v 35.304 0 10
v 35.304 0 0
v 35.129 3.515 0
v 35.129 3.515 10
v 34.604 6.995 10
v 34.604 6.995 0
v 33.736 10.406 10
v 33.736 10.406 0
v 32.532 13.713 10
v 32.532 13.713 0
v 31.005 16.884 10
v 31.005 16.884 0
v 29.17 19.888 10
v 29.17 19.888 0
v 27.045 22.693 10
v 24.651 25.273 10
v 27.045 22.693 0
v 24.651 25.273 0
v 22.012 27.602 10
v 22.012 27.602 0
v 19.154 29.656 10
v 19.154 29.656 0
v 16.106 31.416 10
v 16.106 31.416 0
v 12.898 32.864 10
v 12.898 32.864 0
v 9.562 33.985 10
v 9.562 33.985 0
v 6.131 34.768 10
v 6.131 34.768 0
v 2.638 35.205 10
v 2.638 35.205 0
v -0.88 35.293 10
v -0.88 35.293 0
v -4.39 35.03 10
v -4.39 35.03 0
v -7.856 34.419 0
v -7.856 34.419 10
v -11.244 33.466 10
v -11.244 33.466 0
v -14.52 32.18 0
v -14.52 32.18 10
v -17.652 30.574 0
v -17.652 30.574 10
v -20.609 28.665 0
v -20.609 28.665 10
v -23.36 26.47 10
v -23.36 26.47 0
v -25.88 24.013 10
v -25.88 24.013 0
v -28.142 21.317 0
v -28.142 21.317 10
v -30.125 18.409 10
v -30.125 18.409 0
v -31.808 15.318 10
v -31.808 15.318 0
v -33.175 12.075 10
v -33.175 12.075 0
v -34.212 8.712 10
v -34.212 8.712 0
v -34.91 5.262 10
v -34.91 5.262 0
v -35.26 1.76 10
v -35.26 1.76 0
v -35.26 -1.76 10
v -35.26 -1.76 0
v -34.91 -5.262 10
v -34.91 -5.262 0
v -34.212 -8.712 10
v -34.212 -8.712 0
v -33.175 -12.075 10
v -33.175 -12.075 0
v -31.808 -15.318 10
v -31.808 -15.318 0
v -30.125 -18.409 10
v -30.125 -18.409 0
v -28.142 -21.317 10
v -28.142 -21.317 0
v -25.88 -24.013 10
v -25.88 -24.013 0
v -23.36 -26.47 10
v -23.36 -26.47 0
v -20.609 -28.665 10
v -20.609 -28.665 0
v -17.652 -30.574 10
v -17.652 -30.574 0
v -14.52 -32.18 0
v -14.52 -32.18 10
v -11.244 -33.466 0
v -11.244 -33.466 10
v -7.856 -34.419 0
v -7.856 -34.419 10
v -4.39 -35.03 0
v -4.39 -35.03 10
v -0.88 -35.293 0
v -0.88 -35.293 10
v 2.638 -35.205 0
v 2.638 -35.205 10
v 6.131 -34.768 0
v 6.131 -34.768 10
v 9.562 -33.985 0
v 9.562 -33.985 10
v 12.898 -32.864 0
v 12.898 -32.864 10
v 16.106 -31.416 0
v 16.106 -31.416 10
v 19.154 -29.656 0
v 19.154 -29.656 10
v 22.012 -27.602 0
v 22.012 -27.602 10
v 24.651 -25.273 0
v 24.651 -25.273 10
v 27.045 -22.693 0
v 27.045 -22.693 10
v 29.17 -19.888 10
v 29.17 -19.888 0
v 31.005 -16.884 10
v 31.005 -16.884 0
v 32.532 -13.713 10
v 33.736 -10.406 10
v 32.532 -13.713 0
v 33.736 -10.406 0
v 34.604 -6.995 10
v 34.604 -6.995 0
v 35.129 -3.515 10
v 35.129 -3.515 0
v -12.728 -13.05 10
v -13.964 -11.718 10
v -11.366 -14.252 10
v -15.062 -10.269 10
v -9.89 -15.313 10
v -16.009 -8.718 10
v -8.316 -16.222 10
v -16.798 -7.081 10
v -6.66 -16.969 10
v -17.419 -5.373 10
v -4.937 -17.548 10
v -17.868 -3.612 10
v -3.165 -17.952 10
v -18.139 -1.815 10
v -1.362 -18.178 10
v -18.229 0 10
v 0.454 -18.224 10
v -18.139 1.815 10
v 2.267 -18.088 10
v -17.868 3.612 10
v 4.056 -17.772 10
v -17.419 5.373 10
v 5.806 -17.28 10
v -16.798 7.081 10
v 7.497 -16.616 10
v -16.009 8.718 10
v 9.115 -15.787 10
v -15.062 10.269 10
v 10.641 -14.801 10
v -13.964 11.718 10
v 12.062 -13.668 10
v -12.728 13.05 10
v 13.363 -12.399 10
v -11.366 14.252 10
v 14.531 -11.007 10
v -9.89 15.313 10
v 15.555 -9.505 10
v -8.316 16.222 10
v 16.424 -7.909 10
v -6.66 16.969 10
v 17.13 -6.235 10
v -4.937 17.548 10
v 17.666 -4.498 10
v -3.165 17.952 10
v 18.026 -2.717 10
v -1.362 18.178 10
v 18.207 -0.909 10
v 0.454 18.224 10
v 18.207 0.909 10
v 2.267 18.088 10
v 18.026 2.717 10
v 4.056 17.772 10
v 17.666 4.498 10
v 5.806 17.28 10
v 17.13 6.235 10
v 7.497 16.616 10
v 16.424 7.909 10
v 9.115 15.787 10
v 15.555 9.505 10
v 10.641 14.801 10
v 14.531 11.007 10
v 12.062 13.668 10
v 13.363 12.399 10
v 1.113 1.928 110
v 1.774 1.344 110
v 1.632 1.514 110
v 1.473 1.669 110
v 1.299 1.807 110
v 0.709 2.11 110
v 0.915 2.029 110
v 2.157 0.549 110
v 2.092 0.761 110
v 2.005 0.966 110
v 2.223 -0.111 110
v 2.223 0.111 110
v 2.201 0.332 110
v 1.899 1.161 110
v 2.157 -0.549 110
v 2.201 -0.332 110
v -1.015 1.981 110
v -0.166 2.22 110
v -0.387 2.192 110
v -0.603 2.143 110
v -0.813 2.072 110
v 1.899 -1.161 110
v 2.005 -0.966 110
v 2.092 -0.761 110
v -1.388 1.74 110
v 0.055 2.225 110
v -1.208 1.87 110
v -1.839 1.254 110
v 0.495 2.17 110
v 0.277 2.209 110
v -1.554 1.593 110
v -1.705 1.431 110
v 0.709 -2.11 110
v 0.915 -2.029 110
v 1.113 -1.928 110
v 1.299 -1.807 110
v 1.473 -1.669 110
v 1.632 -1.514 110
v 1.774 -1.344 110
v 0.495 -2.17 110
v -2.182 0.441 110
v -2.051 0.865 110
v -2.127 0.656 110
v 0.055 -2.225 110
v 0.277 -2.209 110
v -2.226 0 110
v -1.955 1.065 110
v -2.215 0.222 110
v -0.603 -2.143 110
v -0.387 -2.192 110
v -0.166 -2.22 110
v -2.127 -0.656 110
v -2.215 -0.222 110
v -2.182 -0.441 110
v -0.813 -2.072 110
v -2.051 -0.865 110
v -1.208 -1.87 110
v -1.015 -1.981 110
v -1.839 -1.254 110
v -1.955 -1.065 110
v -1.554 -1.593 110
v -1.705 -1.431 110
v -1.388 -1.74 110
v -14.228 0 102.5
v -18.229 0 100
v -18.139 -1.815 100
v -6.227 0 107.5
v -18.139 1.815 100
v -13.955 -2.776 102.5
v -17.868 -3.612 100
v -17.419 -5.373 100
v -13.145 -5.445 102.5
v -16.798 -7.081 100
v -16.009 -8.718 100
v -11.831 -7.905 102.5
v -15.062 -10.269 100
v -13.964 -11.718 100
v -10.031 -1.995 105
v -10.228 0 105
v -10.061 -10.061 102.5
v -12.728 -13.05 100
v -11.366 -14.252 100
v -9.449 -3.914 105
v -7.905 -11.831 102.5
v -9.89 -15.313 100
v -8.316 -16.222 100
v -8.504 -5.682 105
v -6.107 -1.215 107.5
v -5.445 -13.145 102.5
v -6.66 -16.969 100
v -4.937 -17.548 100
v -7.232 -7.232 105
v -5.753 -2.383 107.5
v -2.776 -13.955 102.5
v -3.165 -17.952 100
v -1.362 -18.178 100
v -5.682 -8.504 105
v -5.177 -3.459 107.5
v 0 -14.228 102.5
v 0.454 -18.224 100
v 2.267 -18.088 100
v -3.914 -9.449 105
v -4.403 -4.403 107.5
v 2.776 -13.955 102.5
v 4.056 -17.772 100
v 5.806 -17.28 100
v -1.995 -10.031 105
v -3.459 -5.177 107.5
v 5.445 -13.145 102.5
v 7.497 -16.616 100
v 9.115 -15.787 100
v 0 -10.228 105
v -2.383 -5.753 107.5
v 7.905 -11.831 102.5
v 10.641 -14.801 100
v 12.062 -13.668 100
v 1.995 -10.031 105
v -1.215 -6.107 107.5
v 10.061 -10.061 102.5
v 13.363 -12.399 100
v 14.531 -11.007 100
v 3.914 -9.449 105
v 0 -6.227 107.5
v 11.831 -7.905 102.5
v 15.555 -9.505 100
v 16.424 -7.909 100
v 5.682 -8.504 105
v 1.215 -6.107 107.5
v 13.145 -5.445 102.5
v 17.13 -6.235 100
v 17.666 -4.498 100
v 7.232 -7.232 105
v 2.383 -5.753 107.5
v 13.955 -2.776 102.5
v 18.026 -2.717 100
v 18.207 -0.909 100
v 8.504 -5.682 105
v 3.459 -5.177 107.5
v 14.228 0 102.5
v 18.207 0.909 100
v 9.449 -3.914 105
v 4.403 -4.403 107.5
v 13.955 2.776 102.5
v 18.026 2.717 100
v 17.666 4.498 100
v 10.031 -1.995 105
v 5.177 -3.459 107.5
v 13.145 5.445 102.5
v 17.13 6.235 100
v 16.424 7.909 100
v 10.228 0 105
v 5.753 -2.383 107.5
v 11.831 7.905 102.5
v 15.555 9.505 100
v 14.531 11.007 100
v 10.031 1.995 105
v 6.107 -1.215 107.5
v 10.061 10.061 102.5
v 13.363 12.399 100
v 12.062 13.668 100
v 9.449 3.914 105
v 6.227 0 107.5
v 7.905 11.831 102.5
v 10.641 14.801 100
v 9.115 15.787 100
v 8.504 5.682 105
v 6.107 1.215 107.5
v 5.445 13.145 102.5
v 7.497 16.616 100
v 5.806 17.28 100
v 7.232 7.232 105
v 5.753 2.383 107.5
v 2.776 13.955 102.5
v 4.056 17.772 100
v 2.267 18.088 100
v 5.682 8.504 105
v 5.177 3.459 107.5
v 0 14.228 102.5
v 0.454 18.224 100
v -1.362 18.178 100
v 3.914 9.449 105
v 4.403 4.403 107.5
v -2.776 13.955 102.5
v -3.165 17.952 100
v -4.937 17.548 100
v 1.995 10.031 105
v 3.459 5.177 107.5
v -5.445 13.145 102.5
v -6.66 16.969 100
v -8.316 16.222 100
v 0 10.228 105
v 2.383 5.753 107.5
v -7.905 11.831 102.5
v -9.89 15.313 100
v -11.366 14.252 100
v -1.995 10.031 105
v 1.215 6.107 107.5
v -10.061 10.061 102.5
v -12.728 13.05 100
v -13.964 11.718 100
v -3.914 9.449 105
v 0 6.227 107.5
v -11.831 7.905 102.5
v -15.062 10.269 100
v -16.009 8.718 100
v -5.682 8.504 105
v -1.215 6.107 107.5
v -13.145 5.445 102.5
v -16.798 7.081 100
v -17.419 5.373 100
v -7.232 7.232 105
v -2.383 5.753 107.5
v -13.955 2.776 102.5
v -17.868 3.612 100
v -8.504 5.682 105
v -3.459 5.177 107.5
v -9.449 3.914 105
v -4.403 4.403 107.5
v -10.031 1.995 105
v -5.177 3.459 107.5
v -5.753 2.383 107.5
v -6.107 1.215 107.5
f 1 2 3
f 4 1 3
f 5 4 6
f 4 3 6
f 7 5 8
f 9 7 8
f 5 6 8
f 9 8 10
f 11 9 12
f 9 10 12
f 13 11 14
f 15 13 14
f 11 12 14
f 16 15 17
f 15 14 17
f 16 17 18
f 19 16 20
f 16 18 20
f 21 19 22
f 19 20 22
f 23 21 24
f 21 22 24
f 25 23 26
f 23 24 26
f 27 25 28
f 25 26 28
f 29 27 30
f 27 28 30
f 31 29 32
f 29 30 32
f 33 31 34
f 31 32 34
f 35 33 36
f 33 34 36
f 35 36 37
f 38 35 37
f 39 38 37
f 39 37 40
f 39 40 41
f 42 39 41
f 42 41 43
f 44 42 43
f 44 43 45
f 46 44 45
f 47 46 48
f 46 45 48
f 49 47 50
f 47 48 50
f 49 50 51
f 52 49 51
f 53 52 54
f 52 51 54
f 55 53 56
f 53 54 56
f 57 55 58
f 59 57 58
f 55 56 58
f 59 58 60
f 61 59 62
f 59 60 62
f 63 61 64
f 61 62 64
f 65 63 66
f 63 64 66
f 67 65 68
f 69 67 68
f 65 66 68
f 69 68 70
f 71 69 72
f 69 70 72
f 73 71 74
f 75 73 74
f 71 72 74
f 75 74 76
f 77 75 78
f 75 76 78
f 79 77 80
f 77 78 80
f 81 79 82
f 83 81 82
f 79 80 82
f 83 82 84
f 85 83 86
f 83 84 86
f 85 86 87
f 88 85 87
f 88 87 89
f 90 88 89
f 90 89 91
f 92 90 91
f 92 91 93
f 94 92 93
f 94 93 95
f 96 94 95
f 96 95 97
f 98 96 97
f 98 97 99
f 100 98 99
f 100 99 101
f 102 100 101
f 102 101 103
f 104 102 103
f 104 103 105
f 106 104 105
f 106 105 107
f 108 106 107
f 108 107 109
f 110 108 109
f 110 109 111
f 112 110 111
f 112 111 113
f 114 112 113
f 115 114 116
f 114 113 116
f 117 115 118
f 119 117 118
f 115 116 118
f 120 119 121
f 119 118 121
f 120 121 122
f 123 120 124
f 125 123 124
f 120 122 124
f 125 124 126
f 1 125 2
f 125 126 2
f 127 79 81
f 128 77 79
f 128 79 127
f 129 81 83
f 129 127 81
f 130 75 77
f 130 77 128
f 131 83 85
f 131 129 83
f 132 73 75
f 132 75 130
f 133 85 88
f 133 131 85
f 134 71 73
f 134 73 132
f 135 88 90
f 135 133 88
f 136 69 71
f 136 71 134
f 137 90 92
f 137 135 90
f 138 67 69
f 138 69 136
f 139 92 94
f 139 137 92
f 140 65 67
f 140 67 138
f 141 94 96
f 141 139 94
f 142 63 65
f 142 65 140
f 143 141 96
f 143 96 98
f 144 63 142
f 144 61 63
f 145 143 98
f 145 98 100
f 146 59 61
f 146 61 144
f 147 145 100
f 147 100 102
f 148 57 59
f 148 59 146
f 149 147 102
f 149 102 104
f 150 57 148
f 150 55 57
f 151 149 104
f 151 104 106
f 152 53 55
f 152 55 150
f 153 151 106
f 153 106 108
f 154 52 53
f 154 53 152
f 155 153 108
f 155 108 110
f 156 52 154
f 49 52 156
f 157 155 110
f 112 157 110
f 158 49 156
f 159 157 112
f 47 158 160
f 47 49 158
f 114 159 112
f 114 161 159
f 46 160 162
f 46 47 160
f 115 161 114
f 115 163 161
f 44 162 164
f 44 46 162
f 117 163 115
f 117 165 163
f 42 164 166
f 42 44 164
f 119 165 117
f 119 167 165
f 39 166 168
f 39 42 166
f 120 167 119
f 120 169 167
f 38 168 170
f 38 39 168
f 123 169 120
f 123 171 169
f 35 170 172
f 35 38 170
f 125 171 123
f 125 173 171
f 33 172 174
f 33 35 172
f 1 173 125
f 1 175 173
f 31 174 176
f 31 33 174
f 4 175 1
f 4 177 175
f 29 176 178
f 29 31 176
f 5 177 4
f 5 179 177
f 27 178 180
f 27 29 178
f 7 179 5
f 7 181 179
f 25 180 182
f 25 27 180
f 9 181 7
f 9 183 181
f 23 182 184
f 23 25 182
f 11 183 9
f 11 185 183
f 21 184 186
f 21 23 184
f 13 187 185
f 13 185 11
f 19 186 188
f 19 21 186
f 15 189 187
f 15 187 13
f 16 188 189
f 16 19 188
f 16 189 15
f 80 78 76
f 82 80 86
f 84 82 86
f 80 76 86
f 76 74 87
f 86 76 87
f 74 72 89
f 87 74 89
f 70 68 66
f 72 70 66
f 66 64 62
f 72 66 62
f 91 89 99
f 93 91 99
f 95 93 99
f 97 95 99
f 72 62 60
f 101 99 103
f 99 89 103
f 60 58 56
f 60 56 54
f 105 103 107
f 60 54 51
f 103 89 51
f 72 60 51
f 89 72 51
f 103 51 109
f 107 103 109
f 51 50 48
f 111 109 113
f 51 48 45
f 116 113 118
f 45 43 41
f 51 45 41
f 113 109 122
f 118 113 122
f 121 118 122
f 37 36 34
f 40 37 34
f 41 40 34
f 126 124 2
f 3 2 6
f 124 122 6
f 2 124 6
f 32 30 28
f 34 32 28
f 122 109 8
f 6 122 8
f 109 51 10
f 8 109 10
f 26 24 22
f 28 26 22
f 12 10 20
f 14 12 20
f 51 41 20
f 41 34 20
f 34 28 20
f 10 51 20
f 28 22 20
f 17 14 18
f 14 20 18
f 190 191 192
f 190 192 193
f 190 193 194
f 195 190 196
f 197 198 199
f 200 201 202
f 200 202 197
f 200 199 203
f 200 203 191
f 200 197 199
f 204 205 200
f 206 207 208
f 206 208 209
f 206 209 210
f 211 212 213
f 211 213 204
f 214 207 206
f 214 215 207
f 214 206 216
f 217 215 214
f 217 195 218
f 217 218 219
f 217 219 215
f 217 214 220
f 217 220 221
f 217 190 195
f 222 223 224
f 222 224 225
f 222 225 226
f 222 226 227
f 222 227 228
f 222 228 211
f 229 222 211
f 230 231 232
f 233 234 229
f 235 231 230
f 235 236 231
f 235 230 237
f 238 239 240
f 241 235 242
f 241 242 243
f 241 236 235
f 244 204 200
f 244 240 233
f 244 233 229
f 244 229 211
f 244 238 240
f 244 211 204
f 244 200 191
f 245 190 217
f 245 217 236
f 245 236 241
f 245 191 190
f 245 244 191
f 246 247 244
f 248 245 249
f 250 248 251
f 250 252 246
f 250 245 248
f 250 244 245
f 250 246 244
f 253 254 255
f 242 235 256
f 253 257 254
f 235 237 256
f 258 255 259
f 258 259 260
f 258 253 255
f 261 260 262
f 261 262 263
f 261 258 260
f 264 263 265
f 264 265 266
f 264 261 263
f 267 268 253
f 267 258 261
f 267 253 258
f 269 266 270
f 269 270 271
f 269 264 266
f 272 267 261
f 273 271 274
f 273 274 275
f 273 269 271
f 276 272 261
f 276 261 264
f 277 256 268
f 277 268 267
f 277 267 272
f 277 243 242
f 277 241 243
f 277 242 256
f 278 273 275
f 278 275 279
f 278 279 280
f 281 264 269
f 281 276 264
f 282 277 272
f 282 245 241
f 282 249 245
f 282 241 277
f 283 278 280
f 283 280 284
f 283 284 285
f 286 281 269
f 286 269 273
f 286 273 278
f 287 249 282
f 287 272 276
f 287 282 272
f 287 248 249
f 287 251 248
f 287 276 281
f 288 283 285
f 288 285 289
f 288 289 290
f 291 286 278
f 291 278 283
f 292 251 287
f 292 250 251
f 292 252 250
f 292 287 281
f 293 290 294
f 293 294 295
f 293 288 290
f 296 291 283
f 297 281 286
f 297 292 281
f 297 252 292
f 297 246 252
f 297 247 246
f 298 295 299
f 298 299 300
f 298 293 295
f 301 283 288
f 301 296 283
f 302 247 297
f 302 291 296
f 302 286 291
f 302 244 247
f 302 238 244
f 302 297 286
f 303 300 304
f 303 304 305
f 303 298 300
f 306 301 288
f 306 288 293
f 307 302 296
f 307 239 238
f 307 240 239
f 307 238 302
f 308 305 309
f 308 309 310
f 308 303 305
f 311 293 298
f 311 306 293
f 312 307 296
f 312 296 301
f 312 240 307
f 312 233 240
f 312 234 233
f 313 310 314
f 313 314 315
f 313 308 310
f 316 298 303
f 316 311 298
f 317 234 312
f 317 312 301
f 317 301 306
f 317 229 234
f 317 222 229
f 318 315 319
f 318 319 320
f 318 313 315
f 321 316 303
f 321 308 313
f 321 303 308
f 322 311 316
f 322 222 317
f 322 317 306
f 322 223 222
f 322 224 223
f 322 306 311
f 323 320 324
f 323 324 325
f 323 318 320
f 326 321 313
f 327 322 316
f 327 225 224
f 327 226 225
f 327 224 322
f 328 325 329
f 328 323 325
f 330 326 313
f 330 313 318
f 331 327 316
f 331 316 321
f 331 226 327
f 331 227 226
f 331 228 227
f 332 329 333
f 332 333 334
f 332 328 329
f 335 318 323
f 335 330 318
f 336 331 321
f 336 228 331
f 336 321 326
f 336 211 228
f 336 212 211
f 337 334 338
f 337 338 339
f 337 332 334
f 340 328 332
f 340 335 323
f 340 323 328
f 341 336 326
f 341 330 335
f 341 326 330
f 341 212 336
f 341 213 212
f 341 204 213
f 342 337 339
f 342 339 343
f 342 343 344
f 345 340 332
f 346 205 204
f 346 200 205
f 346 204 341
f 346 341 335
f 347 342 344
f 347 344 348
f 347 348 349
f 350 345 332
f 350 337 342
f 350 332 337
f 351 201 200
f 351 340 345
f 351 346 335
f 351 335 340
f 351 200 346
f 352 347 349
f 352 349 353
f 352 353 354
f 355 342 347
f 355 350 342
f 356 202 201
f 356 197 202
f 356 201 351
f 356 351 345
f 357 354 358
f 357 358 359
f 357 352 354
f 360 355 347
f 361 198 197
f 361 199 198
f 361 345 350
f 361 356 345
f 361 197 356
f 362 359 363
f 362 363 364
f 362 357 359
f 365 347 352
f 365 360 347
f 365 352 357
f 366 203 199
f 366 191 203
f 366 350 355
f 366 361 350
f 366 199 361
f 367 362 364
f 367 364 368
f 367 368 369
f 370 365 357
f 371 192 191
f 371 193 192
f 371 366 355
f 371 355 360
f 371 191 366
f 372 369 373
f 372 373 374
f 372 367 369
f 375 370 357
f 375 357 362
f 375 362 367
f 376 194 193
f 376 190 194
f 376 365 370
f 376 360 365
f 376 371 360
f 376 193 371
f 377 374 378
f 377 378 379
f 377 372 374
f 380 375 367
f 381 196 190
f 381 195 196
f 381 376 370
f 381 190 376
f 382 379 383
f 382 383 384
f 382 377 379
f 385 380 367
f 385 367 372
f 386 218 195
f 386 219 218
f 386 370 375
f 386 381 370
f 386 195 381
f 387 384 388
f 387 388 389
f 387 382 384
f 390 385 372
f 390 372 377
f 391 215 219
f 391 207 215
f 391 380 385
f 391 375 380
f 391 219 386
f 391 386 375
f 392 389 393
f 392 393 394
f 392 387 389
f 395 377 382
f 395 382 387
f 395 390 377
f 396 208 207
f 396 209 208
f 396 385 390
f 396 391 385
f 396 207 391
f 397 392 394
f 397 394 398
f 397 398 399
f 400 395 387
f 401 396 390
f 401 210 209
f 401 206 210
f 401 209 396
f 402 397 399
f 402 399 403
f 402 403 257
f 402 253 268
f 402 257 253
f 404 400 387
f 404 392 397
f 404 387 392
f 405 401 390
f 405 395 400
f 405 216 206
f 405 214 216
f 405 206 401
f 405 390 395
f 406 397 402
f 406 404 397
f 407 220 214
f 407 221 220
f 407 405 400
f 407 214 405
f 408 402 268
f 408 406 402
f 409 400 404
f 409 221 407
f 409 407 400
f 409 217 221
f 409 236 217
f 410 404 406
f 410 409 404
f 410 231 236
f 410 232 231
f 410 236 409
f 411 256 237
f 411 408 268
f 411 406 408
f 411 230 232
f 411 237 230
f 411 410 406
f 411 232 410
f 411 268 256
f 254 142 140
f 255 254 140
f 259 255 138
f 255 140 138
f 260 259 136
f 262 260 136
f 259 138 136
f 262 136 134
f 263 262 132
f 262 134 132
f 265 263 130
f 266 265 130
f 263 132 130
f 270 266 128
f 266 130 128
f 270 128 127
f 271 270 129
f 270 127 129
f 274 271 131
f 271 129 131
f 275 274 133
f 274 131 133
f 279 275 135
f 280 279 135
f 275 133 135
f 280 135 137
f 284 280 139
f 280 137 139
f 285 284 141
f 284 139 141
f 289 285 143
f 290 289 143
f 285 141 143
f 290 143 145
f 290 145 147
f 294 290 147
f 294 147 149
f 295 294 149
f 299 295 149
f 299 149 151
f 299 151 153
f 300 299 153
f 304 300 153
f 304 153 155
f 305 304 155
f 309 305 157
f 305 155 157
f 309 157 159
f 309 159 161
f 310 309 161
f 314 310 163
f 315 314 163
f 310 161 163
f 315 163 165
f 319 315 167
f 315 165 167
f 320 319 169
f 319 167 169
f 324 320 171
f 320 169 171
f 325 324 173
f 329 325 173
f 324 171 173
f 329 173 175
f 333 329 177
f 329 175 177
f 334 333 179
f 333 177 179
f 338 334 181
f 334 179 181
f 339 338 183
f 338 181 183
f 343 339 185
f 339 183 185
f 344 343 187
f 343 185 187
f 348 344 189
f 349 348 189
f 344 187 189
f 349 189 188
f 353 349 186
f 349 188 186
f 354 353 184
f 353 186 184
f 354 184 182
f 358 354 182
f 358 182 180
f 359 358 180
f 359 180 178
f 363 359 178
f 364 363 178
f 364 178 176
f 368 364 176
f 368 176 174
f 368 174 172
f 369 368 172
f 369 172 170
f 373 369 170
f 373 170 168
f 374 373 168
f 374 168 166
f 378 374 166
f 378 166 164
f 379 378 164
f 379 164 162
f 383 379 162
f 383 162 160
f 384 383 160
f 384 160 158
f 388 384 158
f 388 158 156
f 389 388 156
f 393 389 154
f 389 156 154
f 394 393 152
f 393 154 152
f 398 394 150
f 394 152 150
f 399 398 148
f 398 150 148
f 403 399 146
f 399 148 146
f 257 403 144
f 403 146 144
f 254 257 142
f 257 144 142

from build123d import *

# Parameters (mm, degrees)
SKETCH1_R           = 35.304197416
BOSS_EXTRUDE1_DEPTH = 10
SKETCH2_R           = 18.229259508
BOSS_EXTRUDE2_DEPTH = 100
CHAMFER1_SIZE       = 10
CHAMFER1_SIZE2      = 16.00334529


with BuildPart() as part:
    # Sketch1 → Boss-Extrude1 (new body)
    with BuildSketch(Plane.XY):
        Circle(SKETCH1_R)
    extrude(amount=BOSS_EXTRUDE1_DEPTH)

    # Sketch2 → Boss-Extrude2 (add)
    with BuildSketch(Plane.XY.offset(10)):
        with Locations(Location((0, 0, 0), (0, 0, 180))):
            Circle(SKETCH2_R)
    extrude(amount=BOSS_EXTRUDE2_DEPTH)

    # Chamfer1
    chamfer1_edges = [part.edges().sort_by_distance(p)[0] for p in [
        (18.229259508, 0, 110),
    ]]
    chamfer1_side = [part.faces().sort_by_distance(p)[0] for p in [
        (18.229259508, 0, 60),
    ]]
    chamfer(chamfer1_edges, length=CHAMFER1_SIZE, length2=CHAMFER1_SIZE2, reference=chamfer1_side[0])


solid = part.part
